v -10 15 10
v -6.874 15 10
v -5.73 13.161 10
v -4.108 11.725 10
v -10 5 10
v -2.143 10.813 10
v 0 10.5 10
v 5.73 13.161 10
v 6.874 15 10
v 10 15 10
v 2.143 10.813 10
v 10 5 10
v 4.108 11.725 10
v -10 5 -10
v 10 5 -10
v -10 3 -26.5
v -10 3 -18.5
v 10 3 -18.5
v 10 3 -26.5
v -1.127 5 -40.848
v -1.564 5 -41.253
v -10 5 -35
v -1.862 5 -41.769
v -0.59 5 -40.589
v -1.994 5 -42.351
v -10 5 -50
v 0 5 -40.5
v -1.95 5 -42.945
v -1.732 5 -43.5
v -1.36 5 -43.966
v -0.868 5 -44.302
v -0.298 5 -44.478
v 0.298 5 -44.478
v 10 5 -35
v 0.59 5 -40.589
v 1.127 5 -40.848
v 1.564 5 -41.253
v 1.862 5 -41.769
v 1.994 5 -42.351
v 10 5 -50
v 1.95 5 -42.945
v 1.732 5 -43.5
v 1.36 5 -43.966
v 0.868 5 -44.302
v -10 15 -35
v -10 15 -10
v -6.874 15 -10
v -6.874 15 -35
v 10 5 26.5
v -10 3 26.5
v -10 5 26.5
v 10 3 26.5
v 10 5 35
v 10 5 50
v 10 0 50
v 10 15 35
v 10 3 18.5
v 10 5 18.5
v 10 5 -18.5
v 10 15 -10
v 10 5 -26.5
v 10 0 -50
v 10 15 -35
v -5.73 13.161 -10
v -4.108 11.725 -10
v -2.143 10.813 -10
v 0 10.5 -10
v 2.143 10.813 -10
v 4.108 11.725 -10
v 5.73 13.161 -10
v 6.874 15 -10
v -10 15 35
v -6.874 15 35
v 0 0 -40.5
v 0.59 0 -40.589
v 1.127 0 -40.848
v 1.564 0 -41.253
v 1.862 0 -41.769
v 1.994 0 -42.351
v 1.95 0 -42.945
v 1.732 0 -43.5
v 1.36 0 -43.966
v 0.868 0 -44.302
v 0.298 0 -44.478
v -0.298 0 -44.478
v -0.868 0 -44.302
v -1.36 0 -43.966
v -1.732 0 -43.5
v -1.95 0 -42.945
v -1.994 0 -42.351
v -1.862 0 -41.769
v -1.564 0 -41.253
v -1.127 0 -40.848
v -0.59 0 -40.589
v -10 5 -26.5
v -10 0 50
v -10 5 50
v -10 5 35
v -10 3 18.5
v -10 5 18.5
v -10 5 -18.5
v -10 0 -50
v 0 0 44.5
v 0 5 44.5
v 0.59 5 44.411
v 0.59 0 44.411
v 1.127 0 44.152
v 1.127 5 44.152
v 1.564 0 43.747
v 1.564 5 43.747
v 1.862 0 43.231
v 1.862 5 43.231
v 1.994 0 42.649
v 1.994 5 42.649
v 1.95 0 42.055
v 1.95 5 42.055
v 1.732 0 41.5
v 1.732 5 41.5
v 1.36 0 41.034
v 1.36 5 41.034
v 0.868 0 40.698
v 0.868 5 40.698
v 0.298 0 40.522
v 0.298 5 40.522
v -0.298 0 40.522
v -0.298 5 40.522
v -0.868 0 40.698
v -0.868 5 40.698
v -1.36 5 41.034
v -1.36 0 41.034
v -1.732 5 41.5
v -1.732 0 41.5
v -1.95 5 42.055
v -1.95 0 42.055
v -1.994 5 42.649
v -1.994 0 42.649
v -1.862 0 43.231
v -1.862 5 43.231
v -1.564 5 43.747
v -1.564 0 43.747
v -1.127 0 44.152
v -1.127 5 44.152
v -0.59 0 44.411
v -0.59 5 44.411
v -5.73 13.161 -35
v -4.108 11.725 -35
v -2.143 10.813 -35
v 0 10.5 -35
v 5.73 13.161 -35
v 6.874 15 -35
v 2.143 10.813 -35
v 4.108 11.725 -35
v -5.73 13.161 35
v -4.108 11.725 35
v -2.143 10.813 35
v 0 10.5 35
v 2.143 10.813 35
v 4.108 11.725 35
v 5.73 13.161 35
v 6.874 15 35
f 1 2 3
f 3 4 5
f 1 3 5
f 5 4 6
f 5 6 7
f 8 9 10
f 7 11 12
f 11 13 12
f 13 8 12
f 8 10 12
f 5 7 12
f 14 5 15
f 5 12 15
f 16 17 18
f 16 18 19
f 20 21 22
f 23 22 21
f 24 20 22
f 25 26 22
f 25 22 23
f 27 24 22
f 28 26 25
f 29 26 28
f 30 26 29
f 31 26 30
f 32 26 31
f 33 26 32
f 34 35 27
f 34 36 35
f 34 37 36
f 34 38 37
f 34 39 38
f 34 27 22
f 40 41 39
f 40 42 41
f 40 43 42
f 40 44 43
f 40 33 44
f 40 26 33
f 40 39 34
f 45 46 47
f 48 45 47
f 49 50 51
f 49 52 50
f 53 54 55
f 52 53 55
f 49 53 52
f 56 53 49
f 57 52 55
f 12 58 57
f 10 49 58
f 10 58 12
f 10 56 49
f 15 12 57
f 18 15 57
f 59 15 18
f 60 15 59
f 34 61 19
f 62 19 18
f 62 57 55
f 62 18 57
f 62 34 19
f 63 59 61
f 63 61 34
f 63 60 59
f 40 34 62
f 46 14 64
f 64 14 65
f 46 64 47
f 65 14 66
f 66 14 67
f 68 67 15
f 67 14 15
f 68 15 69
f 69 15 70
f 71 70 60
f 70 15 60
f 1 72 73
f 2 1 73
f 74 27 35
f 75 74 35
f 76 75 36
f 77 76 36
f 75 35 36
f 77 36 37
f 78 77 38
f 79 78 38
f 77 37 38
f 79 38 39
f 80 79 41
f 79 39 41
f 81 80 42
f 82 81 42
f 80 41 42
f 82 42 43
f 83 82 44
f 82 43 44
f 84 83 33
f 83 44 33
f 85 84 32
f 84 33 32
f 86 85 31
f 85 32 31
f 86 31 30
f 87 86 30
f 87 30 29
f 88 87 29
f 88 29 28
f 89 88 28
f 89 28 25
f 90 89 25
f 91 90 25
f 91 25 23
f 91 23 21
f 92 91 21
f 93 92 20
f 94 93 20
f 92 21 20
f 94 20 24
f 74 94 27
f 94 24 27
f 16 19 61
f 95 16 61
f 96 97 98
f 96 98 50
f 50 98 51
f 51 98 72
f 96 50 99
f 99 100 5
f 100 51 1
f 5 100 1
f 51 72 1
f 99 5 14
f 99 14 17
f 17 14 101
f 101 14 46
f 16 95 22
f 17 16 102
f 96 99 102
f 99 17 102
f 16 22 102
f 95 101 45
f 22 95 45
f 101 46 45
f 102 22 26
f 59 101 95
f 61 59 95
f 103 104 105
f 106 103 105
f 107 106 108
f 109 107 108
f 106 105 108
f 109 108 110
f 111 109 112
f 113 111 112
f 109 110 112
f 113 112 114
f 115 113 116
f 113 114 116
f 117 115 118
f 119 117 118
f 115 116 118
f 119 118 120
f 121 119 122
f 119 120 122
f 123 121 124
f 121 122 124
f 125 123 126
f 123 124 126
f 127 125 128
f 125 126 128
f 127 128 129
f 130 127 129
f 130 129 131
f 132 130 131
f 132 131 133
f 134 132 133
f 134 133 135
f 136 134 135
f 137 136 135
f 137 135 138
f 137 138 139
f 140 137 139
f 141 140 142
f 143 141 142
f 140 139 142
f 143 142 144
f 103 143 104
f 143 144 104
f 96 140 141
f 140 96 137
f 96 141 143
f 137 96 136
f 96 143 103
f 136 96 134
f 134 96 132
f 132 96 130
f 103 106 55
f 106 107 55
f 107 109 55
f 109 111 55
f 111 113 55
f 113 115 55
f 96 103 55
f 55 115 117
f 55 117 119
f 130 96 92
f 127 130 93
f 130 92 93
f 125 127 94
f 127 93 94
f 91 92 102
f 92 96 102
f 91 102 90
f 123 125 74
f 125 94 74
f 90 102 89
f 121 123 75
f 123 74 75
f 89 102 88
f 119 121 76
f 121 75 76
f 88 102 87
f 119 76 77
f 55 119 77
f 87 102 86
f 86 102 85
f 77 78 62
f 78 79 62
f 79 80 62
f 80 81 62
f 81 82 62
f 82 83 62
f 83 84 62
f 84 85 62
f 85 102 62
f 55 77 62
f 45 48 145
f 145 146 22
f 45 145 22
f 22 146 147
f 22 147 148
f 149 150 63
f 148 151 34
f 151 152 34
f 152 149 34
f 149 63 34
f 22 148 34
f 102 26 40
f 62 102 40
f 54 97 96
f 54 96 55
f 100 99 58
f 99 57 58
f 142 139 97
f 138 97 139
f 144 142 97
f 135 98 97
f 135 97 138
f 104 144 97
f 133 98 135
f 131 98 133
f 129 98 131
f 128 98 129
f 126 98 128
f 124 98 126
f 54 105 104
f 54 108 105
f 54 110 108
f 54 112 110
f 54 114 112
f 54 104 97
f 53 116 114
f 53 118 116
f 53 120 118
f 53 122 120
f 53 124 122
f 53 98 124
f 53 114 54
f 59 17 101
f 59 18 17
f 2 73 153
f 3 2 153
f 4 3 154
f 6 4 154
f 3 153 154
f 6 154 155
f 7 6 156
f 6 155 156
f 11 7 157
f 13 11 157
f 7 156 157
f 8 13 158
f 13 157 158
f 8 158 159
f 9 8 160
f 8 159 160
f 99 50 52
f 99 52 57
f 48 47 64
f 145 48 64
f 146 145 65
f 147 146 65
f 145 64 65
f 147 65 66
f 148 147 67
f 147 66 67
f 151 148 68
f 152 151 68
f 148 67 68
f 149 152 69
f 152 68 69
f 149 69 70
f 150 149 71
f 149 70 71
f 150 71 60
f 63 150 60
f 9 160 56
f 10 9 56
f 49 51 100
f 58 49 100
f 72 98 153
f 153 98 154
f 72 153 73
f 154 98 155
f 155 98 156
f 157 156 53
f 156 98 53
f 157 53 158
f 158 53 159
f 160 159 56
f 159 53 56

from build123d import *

# Parameters (mm, degrees)
ESBO_O1_W                = 8
ESBO_O1_H                = 2
RESSALTO_EXTRUS_O1_DEPTH = 10
CORTE_EXTRUS_O1_REACH    = 74.966
ESBO_O4_W                = 20
ESBO_O4_H                = 15
ESBO_O4_R                = 2
RESSALTO_EXTRUS_O2_DEPTH = 5


with BuildPart() as part:
    # Esboço1 → Ressalto-extrusão1 (new, symmetric)
    with BuildSketch(Plane(origin=(0, 0, 0), x_dir=(0, 0, -1), z_dir=(1, 0, 0))):
        Polygon((-35, 18), (-10, 18), (-10, 5), (10, 5), (10, 18), (35, 18), (35, 0), (-35, 0), align=None)
        with Locations((-22.5, 4)):
            Rectangle(ESBO_O1_W, ESBO_O1_H, mode=Mode.SUBTRACT)
        with Locations((22.5, 4)):
            Rectangle(ESBO_O1_W, ESBO_O1_H, mode=Mode.SUBTRACT)
    extrude(amount=RESSALTO_EXTRUS_O1_DEPTH, both=True)

    # Corte-extrusão1: up to this face of the body (flat: up to its plane)
    corte_extrus_o1_end = Plane(part.part.faces().sort_by_distance((0, 9, -35))[0])
    # Esboço2 → Corte-extrusão1 (cut, up to the picked face)
    with BuildSketch(Plane.XY.offset(35), mode=Mode.PRIVATE) as corte_extrus_o1_sk1:
        with BuildLine():
            Line((-10, 15), (-6.873863542, 15))
            ThreePointArc((-6.873863542, 15), (0, 10.5), (6.873863542, 15))
            Line((6.873863542, 15), (10, 15))
            Line((10, 15), (10, 18))
            Line((10, 18), (7.5, 18))
            Line((7.5, 18), (-7.5, 18))
            Line((-7.5, 18), (-10, 18))
            Line((-10, 18), (-10, 15))
        make_face()
    corte_extrus_o1_tool1 = split(extrude(corte_extrus_o1_sk1.sketch, amount=-CORTE_EXTRUS_O1_REACH, mode=Mode.PRIVATE), bisect_by=corte_extrus_o1_end, keep=Keep.BOTH, mode=Mode.PRIVATE)
    add(corte_extrus_o1_tool1.solids().sort_by(Axis((0, 15.069195, 35), (0, 0, -1)))[0], mode=Mode.SUBTRACT)

    # Esboço4 → Ressalto-extrusão2 (add)
    # profile 1 of 2: a face of its own
    with BuildSketch(Plane(origin=(0, 5, 0), x_dir=(1, 0, 0), z_dir=(0, 1, 0))):
        with Locations((0, 42.5)):
            Rectangle(ESBO_O4_W, ESBO_O4_H)
        with Locations(Location((0, 42.5, 0), (0, 0, 270))):
            Circle(ESBO_O4_R, mode=Mode.SUBTRACT)
    # profile 2 of 2: a face of its own
    with BuildSketch(Plane(origin=(0, 5, 0), x_dir=(1, 0, 0), z_dir=(0, 1, 0))):
        with Locations((0, -42.5)):
            Rectangle(ESBO_O4_W, ESBO_O4_H)
        with Locations(Location((0, -42.5, 0), (0, 0, 270))):
            Circle(ESBO_O4_R, mode=Mode.SUBTRACT)
    extrude(amount=-RESSALTO_EXTRUS_O2_DEPTH)


solid = part.part
